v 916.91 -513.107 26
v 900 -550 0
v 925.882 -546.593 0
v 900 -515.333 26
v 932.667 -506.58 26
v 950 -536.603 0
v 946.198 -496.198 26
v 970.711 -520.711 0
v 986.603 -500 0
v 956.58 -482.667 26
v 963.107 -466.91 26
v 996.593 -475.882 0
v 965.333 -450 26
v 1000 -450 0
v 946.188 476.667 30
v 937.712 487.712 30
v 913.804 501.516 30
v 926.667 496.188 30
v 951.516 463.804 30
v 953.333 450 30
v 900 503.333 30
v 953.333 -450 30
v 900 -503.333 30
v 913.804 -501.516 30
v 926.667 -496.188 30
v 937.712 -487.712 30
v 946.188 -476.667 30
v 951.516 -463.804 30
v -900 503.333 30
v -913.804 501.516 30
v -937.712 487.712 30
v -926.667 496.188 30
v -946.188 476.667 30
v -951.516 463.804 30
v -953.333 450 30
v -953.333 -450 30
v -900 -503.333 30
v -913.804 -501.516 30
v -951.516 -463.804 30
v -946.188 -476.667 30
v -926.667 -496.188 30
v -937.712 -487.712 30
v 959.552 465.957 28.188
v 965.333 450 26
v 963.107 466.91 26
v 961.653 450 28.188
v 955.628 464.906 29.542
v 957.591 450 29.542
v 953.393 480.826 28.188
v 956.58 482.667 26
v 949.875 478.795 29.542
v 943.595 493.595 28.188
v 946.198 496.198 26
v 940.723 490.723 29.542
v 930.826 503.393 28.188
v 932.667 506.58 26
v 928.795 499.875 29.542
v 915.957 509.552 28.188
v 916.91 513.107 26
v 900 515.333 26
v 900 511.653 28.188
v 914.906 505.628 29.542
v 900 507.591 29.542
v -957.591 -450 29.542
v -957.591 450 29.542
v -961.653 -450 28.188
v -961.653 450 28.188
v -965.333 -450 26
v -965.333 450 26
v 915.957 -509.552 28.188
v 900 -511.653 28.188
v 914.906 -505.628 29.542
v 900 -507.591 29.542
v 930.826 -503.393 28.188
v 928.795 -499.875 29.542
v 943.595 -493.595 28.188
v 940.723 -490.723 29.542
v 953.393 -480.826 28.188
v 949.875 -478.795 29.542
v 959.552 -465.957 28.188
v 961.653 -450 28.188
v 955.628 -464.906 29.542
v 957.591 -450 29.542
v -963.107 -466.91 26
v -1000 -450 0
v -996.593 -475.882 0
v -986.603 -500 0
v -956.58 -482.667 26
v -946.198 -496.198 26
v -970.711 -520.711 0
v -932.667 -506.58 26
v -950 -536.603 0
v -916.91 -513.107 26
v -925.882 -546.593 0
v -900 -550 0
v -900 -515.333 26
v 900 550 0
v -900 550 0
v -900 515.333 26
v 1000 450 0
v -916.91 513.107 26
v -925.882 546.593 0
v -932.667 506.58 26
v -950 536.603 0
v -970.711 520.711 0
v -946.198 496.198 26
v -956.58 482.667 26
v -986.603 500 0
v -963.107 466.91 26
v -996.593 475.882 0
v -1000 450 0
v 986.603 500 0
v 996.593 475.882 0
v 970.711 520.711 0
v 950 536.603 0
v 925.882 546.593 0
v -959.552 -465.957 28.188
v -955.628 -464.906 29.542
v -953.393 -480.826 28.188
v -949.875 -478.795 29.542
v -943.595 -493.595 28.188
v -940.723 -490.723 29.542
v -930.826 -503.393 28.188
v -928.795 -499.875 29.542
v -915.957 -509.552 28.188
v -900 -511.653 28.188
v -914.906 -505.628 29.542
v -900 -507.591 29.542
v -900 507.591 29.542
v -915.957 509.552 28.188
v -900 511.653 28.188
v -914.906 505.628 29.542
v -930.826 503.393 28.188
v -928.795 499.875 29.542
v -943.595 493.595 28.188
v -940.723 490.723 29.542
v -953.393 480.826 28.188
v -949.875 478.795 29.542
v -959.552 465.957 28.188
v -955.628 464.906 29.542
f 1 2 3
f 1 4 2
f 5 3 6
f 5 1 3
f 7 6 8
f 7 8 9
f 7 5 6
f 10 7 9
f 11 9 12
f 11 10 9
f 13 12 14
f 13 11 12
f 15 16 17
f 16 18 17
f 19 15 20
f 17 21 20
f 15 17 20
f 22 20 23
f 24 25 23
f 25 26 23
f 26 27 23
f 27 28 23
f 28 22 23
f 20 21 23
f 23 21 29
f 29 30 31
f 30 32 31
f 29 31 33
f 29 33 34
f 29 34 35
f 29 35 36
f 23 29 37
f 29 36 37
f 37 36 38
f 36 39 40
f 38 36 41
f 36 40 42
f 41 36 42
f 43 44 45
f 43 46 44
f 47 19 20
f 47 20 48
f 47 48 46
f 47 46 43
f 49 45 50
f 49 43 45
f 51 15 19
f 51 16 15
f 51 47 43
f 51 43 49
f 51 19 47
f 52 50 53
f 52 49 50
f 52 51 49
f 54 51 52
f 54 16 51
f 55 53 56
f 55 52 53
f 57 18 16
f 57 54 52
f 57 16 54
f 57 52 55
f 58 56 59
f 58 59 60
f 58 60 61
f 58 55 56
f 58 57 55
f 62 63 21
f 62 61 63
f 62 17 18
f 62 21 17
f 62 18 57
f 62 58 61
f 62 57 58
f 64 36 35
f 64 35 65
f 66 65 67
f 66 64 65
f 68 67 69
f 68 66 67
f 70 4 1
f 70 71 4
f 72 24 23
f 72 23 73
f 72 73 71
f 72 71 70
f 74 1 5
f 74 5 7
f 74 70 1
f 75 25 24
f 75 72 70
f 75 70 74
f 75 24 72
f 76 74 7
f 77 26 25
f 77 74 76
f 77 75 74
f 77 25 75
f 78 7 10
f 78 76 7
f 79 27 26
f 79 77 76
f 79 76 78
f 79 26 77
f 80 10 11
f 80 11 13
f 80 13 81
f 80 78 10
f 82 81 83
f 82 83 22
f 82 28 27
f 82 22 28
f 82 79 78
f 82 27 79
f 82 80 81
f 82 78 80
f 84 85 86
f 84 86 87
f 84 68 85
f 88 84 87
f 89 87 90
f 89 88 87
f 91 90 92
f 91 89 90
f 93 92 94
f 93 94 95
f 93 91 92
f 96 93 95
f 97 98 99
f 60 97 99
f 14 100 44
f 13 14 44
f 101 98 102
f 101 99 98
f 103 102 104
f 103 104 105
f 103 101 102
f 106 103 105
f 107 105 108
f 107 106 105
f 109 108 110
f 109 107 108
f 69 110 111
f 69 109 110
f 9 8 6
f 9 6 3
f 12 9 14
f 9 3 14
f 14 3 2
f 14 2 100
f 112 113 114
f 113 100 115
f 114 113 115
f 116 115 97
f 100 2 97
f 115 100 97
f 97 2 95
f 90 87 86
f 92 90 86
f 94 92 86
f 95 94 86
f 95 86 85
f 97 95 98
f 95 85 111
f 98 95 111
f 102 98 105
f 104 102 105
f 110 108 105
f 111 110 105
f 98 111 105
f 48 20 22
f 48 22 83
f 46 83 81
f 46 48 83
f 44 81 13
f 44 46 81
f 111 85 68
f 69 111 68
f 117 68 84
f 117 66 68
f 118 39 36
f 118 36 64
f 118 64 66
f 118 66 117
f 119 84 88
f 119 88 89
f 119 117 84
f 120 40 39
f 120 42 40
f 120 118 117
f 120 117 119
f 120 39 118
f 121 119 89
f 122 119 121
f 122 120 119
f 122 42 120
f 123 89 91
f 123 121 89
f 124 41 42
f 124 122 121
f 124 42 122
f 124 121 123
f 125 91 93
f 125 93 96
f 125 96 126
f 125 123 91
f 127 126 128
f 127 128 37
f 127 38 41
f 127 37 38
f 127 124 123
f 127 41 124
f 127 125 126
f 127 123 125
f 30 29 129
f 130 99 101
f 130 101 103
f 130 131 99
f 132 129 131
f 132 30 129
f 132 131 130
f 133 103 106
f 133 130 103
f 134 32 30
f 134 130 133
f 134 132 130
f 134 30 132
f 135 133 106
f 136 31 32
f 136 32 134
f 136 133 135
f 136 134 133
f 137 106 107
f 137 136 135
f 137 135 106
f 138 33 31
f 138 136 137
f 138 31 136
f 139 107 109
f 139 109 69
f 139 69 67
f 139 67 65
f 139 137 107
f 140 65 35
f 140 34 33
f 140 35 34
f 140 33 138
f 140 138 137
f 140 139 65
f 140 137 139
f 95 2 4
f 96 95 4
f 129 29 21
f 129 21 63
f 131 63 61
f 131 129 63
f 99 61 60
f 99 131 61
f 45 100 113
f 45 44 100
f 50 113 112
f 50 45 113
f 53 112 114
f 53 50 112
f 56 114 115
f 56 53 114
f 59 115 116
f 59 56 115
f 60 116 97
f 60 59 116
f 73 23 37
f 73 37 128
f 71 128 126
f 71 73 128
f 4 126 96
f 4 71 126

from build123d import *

# Parameters (mm, degrees)
F0_W     = 1900
F0_H     = 1000
F1_DEPTH = 30
F2_R     = 50


with BuildPart() as f1:
    # F0 (on Top) → F1 (new body)
    with BuildSketch(Plane.XY):
        Rectangle(F0_W, F0_H)
    extrude(amount=F1_DEPTH)

    # F2
    f2_edges = [f1.edges().sort_by_distance(p)[0] for p in [
        (-950, -500, 15),
        (-950, 500, 15),
        (950, -500, 15),
        (950, 500, 15),
    ]]
    fillet(f2_edges, radius=F2_R)

    # F6: sweep along a path in F5
    with BuildLine(Plane.XY.offset(30)) as f6_path:
        Line((900, 500), (-900, 500))
        ThreePointArc((-900, 500), (-935.3553390593, 485.3553390593), (-950, 450))
        Line((-950, 450), (-950, -450))
        ThreePointArc((-950, -450), (-935.3553390593, -485.3553390593), (-900, -500))
        Line((-900, -500), (900, -500))
        ThreePointArc((900, -500), (935.3553390593, -485.3553390593), (950, -450))
        Line((950, -450), (950, 450))
        ThreePointArc((950, 450), (935.3553390593, 485.3553390593), (900, 500))
    # F4 (on offset) → F6 (sweep)
    with BuildSketch(Plane.XZ.offset(450)):
        with BuildLine():
            Line((953.3333333333, 30), (950, 30))
            Line((950, 30), (950, 0))
            Line((950, 0), (1000, 0))
            Line((1000, 0), (965.3333333333, 26))
            ThreePointArc((965.3333333333, 26), (959.6578886537, 28.973665961), (953.3333333333, 30))
        make_face()
    sweep(path=f6_path.line)


solid = f1.part
